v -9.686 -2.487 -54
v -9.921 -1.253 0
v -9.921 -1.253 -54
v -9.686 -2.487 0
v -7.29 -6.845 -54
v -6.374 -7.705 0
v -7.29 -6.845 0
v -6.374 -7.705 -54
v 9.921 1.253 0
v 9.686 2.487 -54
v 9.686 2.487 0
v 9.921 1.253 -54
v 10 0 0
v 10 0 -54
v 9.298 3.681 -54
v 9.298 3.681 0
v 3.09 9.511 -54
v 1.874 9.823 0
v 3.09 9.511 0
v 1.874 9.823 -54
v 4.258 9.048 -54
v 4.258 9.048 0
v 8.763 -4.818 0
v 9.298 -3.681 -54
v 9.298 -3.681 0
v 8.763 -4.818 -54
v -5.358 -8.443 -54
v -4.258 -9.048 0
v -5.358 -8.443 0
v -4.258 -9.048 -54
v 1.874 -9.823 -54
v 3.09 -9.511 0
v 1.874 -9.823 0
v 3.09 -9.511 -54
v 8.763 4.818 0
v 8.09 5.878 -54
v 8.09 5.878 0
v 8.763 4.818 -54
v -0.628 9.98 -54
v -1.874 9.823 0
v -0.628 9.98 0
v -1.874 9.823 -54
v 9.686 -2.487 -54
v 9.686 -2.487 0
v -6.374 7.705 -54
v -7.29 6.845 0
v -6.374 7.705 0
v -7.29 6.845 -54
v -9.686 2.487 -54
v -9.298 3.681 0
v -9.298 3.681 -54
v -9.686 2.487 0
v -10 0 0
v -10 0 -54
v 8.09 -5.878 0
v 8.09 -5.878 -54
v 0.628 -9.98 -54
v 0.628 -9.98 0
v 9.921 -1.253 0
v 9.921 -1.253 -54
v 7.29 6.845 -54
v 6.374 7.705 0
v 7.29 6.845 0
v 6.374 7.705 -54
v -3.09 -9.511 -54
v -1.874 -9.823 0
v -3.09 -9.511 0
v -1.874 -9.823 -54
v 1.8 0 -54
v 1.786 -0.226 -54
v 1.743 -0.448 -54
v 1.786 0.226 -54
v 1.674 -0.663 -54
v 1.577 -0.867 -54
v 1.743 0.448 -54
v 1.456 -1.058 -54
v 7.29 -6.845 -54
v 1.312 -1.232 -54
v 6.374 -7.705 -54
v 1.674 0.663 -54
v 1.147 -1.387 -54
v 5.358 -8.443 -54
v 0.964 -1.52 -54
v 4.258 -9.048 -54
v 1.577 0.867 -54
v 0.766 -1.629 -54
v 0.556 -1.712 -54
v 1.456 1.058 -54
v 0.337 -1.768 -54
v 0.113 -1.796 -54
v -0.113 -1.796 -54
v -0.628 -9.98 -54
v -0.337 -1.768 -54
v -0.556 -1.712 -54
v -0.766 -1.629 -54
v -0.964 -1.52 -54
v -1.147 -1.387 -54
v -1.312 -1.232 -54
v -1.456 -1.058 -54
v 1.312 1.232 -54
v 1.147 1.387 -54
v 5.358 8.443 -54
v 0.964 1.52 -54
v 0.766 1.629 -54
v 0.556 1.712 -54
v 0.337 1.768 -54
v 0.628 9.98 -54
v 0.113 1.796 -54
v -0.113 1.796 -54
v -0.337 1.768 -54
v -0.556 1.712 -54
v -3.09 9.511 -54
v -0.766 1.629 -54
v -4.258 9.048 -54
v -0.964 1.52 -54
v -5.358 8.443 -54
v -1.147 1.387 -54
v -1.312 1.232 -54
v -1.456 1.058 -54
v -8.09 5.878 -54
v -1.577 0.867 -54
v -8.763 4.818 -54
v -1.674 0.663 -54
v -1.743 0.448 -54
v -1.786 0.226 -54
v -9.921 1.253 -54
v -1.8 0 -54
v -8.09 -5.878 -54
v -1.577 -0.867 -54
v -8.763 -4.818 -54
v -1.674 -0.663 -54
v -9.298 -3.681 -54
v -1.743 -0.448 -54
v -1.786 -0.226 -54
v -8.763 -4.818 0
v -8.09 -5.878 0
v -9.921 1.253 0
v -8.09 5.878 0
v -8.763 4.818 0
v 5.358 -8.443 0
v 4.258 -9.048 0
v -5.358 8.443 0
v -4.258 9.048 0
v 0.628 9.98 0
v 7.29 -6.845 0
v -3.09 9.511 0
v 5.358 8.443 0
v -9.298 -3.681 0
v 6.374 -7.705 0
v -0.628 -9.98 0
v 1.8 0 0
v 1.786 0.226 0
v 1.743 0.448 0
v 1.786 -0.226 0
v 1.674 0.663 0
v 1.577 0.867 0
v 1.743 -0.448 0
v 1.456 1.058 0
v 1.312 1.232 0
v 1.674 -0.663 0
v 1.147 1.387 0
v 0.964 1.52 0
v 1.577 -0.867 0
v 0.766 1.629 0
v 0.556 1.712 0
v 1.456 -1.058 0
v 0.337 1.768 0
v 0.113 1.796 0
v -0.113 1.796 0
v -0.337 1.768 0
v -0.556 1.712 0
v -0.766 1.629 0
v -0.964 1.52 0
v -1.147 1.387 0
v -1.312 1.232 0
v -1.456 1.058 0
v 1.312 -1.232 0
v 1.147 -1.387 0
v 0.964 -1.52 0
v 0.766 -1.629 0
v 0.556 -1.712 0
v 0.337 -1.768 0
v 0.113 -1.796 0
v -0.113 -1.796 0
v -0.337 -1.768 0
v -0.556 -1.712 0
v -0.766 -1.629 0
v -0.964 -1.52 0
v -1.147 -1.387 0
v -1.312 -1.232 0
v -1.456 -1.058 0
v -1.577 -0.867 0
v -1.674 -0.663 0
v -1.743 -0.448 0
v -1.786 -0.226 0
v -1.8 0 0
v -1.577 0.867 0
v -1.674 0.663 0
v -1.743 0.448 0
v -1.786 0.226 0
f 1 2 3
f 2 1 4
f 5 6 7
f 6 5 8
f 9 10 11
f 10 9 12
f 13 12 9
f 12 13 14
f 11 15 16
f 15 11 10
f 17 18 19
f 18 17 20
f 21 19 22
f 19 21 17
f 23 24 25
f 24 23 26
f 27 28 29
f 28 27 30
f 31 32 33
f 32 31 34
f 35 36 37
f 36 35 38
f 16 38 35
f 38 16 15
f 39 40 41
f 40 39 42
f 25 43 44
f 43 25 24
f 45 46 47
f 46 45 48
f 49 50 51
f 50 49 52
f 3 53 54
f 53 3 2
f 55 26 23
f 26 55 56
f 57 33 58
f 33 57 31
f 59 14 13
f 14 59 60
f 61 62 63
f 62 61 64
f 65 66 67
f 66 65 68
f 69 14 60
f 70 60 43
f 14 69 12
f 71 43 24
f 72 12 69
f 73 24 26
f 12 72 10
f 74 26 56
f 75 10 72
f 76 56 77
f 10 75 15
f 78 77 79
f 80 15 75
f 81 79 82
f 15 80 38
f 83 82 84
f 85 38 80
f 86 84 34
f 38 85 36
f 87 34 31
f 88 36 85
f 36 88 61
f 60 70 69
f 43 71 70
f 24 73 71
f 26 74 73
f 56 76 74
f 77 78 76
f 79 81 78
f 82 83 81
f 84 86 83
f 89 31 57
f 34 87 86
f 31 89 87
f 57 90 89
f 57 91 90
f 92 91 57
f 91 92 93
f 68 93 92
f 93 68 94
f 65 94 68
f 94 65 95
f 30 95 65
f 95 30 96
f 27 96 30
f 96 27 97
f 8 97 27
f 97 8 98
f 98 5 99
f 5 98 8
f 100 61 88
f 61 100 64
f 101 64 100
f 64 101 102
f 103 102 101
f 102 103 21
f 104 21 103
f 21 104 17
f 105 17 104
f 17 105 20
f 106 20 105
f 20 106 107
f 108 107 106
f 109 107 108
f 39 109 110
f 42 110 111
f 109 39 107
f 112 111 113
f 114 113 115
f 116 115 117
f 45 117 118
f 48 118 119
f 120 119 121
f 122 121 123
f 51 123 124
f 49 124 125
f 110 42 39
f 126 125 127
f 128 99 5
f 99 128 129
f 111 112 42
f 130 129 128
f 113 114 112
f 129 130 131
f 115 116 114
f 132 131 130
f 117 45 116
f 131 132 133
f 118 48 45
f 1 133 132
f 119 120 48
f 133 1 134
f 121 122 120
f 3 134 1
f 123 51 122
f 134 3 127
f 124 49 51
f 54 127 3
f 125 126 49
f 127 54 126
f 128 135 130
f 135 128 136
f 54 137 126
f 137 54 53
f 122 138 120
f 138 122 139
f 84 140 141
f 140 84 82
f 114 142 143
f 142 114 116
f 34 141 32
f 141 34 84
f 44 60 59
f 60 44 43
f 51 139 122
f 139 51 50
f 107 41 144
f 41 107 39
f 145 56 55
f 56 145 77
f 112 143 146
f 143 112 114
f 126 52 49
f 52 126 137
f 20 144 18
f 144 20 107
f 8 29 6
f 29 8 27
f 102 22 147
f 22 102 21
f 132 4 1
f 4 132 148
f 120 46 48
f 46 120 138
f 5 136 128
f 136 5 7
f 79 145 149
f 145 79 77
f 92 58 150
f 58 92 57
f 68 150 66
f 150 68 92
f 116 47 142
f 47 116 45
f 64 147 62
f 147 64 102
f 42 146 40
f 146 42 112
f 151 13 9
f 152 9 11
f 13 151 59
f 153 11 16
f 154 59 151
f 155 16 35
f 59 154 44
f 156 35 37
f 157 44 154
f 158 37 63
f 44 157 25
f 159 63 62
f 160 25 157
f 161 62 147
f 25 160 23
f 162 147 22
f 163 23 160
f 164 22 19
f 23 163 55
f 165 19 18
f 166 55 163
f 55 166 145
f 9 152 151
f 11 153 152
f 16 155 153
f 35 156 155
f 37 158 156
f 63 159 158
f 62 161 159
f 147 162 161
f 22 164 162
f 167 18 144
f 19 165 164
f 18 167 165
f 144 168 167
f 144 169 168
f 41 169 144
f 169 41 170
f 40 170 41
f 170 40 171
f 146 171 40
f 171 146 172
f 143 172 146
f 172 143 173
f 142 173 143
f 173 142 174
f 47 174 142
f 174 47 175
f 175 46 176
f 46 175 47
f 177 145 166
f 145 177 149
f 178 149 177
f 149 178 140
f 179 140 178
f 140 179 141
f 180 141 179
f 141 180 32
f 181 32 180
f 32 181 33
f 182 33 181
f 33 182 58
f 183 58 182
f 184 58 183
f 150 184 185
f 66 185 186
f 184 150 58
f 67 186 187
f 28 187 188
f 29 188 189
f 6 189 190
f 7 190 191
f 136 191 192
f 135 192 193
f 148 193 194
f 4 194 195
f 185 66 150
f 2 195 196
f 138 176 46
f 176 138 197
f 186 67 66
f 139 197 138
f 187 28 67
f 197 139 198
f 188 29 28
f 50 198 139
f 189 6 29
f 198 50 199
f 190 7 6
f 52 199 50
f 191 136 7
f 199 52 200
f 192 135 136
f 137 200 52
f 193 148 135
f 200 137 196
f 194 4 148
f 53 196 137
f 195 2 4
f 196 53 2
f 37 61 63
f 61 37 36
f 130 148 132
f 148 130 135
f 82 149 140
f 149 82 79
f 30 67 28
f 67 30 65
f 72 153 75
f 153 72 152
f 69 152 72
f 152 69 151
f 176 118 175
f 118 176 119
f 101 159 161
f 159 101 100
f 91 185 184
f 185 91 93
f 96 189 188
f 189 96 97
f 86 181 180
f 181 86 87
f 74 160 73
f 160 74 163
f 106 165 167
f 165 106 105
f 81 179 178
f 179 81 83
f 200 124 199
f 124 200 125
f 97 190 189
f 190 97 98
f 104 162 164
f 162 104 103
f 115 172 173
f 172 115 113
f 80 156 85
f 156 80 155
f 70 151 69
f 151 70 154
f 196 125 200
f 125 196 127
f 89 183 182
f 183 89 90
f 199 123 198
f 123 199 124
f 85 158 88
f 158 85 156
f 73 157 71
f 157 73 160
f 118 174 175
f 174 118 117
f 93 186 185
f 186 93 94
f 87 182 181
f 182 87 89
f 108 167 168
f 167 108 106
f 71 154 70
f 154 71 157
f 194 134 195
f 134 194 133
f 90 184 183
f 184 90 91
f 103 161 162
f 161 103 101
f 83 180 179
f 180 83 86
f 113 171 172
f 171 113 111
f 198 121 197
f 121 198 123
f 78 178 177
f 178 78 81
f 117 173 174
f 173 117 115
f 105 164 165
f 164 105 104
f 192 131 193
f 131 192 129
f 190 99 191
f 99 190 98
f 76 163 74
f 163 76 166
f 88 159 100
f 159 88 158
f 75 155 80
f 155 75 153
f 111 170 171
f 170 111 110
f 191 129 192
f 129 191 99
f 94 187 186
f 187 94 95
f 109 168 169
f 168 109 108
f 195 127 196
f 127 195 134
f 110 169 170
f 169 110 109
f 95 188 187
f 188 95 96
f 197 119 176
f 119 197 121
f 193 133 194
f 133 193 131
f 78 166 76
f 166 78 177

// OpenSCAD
$fn = 50;


difference() {
	union() {
		translate(v = [0, 0, -54.0000000000]) {
			cylinder(h = 54, r = 10.0000000000);
		}
		cylinder(h = 0, r = 13.0000000000);
	}
	union() {
		#translate(v = [0, 0, -54]) {
			cylinder(h = 54, r = 1.8000000000);
		}
	}
}
